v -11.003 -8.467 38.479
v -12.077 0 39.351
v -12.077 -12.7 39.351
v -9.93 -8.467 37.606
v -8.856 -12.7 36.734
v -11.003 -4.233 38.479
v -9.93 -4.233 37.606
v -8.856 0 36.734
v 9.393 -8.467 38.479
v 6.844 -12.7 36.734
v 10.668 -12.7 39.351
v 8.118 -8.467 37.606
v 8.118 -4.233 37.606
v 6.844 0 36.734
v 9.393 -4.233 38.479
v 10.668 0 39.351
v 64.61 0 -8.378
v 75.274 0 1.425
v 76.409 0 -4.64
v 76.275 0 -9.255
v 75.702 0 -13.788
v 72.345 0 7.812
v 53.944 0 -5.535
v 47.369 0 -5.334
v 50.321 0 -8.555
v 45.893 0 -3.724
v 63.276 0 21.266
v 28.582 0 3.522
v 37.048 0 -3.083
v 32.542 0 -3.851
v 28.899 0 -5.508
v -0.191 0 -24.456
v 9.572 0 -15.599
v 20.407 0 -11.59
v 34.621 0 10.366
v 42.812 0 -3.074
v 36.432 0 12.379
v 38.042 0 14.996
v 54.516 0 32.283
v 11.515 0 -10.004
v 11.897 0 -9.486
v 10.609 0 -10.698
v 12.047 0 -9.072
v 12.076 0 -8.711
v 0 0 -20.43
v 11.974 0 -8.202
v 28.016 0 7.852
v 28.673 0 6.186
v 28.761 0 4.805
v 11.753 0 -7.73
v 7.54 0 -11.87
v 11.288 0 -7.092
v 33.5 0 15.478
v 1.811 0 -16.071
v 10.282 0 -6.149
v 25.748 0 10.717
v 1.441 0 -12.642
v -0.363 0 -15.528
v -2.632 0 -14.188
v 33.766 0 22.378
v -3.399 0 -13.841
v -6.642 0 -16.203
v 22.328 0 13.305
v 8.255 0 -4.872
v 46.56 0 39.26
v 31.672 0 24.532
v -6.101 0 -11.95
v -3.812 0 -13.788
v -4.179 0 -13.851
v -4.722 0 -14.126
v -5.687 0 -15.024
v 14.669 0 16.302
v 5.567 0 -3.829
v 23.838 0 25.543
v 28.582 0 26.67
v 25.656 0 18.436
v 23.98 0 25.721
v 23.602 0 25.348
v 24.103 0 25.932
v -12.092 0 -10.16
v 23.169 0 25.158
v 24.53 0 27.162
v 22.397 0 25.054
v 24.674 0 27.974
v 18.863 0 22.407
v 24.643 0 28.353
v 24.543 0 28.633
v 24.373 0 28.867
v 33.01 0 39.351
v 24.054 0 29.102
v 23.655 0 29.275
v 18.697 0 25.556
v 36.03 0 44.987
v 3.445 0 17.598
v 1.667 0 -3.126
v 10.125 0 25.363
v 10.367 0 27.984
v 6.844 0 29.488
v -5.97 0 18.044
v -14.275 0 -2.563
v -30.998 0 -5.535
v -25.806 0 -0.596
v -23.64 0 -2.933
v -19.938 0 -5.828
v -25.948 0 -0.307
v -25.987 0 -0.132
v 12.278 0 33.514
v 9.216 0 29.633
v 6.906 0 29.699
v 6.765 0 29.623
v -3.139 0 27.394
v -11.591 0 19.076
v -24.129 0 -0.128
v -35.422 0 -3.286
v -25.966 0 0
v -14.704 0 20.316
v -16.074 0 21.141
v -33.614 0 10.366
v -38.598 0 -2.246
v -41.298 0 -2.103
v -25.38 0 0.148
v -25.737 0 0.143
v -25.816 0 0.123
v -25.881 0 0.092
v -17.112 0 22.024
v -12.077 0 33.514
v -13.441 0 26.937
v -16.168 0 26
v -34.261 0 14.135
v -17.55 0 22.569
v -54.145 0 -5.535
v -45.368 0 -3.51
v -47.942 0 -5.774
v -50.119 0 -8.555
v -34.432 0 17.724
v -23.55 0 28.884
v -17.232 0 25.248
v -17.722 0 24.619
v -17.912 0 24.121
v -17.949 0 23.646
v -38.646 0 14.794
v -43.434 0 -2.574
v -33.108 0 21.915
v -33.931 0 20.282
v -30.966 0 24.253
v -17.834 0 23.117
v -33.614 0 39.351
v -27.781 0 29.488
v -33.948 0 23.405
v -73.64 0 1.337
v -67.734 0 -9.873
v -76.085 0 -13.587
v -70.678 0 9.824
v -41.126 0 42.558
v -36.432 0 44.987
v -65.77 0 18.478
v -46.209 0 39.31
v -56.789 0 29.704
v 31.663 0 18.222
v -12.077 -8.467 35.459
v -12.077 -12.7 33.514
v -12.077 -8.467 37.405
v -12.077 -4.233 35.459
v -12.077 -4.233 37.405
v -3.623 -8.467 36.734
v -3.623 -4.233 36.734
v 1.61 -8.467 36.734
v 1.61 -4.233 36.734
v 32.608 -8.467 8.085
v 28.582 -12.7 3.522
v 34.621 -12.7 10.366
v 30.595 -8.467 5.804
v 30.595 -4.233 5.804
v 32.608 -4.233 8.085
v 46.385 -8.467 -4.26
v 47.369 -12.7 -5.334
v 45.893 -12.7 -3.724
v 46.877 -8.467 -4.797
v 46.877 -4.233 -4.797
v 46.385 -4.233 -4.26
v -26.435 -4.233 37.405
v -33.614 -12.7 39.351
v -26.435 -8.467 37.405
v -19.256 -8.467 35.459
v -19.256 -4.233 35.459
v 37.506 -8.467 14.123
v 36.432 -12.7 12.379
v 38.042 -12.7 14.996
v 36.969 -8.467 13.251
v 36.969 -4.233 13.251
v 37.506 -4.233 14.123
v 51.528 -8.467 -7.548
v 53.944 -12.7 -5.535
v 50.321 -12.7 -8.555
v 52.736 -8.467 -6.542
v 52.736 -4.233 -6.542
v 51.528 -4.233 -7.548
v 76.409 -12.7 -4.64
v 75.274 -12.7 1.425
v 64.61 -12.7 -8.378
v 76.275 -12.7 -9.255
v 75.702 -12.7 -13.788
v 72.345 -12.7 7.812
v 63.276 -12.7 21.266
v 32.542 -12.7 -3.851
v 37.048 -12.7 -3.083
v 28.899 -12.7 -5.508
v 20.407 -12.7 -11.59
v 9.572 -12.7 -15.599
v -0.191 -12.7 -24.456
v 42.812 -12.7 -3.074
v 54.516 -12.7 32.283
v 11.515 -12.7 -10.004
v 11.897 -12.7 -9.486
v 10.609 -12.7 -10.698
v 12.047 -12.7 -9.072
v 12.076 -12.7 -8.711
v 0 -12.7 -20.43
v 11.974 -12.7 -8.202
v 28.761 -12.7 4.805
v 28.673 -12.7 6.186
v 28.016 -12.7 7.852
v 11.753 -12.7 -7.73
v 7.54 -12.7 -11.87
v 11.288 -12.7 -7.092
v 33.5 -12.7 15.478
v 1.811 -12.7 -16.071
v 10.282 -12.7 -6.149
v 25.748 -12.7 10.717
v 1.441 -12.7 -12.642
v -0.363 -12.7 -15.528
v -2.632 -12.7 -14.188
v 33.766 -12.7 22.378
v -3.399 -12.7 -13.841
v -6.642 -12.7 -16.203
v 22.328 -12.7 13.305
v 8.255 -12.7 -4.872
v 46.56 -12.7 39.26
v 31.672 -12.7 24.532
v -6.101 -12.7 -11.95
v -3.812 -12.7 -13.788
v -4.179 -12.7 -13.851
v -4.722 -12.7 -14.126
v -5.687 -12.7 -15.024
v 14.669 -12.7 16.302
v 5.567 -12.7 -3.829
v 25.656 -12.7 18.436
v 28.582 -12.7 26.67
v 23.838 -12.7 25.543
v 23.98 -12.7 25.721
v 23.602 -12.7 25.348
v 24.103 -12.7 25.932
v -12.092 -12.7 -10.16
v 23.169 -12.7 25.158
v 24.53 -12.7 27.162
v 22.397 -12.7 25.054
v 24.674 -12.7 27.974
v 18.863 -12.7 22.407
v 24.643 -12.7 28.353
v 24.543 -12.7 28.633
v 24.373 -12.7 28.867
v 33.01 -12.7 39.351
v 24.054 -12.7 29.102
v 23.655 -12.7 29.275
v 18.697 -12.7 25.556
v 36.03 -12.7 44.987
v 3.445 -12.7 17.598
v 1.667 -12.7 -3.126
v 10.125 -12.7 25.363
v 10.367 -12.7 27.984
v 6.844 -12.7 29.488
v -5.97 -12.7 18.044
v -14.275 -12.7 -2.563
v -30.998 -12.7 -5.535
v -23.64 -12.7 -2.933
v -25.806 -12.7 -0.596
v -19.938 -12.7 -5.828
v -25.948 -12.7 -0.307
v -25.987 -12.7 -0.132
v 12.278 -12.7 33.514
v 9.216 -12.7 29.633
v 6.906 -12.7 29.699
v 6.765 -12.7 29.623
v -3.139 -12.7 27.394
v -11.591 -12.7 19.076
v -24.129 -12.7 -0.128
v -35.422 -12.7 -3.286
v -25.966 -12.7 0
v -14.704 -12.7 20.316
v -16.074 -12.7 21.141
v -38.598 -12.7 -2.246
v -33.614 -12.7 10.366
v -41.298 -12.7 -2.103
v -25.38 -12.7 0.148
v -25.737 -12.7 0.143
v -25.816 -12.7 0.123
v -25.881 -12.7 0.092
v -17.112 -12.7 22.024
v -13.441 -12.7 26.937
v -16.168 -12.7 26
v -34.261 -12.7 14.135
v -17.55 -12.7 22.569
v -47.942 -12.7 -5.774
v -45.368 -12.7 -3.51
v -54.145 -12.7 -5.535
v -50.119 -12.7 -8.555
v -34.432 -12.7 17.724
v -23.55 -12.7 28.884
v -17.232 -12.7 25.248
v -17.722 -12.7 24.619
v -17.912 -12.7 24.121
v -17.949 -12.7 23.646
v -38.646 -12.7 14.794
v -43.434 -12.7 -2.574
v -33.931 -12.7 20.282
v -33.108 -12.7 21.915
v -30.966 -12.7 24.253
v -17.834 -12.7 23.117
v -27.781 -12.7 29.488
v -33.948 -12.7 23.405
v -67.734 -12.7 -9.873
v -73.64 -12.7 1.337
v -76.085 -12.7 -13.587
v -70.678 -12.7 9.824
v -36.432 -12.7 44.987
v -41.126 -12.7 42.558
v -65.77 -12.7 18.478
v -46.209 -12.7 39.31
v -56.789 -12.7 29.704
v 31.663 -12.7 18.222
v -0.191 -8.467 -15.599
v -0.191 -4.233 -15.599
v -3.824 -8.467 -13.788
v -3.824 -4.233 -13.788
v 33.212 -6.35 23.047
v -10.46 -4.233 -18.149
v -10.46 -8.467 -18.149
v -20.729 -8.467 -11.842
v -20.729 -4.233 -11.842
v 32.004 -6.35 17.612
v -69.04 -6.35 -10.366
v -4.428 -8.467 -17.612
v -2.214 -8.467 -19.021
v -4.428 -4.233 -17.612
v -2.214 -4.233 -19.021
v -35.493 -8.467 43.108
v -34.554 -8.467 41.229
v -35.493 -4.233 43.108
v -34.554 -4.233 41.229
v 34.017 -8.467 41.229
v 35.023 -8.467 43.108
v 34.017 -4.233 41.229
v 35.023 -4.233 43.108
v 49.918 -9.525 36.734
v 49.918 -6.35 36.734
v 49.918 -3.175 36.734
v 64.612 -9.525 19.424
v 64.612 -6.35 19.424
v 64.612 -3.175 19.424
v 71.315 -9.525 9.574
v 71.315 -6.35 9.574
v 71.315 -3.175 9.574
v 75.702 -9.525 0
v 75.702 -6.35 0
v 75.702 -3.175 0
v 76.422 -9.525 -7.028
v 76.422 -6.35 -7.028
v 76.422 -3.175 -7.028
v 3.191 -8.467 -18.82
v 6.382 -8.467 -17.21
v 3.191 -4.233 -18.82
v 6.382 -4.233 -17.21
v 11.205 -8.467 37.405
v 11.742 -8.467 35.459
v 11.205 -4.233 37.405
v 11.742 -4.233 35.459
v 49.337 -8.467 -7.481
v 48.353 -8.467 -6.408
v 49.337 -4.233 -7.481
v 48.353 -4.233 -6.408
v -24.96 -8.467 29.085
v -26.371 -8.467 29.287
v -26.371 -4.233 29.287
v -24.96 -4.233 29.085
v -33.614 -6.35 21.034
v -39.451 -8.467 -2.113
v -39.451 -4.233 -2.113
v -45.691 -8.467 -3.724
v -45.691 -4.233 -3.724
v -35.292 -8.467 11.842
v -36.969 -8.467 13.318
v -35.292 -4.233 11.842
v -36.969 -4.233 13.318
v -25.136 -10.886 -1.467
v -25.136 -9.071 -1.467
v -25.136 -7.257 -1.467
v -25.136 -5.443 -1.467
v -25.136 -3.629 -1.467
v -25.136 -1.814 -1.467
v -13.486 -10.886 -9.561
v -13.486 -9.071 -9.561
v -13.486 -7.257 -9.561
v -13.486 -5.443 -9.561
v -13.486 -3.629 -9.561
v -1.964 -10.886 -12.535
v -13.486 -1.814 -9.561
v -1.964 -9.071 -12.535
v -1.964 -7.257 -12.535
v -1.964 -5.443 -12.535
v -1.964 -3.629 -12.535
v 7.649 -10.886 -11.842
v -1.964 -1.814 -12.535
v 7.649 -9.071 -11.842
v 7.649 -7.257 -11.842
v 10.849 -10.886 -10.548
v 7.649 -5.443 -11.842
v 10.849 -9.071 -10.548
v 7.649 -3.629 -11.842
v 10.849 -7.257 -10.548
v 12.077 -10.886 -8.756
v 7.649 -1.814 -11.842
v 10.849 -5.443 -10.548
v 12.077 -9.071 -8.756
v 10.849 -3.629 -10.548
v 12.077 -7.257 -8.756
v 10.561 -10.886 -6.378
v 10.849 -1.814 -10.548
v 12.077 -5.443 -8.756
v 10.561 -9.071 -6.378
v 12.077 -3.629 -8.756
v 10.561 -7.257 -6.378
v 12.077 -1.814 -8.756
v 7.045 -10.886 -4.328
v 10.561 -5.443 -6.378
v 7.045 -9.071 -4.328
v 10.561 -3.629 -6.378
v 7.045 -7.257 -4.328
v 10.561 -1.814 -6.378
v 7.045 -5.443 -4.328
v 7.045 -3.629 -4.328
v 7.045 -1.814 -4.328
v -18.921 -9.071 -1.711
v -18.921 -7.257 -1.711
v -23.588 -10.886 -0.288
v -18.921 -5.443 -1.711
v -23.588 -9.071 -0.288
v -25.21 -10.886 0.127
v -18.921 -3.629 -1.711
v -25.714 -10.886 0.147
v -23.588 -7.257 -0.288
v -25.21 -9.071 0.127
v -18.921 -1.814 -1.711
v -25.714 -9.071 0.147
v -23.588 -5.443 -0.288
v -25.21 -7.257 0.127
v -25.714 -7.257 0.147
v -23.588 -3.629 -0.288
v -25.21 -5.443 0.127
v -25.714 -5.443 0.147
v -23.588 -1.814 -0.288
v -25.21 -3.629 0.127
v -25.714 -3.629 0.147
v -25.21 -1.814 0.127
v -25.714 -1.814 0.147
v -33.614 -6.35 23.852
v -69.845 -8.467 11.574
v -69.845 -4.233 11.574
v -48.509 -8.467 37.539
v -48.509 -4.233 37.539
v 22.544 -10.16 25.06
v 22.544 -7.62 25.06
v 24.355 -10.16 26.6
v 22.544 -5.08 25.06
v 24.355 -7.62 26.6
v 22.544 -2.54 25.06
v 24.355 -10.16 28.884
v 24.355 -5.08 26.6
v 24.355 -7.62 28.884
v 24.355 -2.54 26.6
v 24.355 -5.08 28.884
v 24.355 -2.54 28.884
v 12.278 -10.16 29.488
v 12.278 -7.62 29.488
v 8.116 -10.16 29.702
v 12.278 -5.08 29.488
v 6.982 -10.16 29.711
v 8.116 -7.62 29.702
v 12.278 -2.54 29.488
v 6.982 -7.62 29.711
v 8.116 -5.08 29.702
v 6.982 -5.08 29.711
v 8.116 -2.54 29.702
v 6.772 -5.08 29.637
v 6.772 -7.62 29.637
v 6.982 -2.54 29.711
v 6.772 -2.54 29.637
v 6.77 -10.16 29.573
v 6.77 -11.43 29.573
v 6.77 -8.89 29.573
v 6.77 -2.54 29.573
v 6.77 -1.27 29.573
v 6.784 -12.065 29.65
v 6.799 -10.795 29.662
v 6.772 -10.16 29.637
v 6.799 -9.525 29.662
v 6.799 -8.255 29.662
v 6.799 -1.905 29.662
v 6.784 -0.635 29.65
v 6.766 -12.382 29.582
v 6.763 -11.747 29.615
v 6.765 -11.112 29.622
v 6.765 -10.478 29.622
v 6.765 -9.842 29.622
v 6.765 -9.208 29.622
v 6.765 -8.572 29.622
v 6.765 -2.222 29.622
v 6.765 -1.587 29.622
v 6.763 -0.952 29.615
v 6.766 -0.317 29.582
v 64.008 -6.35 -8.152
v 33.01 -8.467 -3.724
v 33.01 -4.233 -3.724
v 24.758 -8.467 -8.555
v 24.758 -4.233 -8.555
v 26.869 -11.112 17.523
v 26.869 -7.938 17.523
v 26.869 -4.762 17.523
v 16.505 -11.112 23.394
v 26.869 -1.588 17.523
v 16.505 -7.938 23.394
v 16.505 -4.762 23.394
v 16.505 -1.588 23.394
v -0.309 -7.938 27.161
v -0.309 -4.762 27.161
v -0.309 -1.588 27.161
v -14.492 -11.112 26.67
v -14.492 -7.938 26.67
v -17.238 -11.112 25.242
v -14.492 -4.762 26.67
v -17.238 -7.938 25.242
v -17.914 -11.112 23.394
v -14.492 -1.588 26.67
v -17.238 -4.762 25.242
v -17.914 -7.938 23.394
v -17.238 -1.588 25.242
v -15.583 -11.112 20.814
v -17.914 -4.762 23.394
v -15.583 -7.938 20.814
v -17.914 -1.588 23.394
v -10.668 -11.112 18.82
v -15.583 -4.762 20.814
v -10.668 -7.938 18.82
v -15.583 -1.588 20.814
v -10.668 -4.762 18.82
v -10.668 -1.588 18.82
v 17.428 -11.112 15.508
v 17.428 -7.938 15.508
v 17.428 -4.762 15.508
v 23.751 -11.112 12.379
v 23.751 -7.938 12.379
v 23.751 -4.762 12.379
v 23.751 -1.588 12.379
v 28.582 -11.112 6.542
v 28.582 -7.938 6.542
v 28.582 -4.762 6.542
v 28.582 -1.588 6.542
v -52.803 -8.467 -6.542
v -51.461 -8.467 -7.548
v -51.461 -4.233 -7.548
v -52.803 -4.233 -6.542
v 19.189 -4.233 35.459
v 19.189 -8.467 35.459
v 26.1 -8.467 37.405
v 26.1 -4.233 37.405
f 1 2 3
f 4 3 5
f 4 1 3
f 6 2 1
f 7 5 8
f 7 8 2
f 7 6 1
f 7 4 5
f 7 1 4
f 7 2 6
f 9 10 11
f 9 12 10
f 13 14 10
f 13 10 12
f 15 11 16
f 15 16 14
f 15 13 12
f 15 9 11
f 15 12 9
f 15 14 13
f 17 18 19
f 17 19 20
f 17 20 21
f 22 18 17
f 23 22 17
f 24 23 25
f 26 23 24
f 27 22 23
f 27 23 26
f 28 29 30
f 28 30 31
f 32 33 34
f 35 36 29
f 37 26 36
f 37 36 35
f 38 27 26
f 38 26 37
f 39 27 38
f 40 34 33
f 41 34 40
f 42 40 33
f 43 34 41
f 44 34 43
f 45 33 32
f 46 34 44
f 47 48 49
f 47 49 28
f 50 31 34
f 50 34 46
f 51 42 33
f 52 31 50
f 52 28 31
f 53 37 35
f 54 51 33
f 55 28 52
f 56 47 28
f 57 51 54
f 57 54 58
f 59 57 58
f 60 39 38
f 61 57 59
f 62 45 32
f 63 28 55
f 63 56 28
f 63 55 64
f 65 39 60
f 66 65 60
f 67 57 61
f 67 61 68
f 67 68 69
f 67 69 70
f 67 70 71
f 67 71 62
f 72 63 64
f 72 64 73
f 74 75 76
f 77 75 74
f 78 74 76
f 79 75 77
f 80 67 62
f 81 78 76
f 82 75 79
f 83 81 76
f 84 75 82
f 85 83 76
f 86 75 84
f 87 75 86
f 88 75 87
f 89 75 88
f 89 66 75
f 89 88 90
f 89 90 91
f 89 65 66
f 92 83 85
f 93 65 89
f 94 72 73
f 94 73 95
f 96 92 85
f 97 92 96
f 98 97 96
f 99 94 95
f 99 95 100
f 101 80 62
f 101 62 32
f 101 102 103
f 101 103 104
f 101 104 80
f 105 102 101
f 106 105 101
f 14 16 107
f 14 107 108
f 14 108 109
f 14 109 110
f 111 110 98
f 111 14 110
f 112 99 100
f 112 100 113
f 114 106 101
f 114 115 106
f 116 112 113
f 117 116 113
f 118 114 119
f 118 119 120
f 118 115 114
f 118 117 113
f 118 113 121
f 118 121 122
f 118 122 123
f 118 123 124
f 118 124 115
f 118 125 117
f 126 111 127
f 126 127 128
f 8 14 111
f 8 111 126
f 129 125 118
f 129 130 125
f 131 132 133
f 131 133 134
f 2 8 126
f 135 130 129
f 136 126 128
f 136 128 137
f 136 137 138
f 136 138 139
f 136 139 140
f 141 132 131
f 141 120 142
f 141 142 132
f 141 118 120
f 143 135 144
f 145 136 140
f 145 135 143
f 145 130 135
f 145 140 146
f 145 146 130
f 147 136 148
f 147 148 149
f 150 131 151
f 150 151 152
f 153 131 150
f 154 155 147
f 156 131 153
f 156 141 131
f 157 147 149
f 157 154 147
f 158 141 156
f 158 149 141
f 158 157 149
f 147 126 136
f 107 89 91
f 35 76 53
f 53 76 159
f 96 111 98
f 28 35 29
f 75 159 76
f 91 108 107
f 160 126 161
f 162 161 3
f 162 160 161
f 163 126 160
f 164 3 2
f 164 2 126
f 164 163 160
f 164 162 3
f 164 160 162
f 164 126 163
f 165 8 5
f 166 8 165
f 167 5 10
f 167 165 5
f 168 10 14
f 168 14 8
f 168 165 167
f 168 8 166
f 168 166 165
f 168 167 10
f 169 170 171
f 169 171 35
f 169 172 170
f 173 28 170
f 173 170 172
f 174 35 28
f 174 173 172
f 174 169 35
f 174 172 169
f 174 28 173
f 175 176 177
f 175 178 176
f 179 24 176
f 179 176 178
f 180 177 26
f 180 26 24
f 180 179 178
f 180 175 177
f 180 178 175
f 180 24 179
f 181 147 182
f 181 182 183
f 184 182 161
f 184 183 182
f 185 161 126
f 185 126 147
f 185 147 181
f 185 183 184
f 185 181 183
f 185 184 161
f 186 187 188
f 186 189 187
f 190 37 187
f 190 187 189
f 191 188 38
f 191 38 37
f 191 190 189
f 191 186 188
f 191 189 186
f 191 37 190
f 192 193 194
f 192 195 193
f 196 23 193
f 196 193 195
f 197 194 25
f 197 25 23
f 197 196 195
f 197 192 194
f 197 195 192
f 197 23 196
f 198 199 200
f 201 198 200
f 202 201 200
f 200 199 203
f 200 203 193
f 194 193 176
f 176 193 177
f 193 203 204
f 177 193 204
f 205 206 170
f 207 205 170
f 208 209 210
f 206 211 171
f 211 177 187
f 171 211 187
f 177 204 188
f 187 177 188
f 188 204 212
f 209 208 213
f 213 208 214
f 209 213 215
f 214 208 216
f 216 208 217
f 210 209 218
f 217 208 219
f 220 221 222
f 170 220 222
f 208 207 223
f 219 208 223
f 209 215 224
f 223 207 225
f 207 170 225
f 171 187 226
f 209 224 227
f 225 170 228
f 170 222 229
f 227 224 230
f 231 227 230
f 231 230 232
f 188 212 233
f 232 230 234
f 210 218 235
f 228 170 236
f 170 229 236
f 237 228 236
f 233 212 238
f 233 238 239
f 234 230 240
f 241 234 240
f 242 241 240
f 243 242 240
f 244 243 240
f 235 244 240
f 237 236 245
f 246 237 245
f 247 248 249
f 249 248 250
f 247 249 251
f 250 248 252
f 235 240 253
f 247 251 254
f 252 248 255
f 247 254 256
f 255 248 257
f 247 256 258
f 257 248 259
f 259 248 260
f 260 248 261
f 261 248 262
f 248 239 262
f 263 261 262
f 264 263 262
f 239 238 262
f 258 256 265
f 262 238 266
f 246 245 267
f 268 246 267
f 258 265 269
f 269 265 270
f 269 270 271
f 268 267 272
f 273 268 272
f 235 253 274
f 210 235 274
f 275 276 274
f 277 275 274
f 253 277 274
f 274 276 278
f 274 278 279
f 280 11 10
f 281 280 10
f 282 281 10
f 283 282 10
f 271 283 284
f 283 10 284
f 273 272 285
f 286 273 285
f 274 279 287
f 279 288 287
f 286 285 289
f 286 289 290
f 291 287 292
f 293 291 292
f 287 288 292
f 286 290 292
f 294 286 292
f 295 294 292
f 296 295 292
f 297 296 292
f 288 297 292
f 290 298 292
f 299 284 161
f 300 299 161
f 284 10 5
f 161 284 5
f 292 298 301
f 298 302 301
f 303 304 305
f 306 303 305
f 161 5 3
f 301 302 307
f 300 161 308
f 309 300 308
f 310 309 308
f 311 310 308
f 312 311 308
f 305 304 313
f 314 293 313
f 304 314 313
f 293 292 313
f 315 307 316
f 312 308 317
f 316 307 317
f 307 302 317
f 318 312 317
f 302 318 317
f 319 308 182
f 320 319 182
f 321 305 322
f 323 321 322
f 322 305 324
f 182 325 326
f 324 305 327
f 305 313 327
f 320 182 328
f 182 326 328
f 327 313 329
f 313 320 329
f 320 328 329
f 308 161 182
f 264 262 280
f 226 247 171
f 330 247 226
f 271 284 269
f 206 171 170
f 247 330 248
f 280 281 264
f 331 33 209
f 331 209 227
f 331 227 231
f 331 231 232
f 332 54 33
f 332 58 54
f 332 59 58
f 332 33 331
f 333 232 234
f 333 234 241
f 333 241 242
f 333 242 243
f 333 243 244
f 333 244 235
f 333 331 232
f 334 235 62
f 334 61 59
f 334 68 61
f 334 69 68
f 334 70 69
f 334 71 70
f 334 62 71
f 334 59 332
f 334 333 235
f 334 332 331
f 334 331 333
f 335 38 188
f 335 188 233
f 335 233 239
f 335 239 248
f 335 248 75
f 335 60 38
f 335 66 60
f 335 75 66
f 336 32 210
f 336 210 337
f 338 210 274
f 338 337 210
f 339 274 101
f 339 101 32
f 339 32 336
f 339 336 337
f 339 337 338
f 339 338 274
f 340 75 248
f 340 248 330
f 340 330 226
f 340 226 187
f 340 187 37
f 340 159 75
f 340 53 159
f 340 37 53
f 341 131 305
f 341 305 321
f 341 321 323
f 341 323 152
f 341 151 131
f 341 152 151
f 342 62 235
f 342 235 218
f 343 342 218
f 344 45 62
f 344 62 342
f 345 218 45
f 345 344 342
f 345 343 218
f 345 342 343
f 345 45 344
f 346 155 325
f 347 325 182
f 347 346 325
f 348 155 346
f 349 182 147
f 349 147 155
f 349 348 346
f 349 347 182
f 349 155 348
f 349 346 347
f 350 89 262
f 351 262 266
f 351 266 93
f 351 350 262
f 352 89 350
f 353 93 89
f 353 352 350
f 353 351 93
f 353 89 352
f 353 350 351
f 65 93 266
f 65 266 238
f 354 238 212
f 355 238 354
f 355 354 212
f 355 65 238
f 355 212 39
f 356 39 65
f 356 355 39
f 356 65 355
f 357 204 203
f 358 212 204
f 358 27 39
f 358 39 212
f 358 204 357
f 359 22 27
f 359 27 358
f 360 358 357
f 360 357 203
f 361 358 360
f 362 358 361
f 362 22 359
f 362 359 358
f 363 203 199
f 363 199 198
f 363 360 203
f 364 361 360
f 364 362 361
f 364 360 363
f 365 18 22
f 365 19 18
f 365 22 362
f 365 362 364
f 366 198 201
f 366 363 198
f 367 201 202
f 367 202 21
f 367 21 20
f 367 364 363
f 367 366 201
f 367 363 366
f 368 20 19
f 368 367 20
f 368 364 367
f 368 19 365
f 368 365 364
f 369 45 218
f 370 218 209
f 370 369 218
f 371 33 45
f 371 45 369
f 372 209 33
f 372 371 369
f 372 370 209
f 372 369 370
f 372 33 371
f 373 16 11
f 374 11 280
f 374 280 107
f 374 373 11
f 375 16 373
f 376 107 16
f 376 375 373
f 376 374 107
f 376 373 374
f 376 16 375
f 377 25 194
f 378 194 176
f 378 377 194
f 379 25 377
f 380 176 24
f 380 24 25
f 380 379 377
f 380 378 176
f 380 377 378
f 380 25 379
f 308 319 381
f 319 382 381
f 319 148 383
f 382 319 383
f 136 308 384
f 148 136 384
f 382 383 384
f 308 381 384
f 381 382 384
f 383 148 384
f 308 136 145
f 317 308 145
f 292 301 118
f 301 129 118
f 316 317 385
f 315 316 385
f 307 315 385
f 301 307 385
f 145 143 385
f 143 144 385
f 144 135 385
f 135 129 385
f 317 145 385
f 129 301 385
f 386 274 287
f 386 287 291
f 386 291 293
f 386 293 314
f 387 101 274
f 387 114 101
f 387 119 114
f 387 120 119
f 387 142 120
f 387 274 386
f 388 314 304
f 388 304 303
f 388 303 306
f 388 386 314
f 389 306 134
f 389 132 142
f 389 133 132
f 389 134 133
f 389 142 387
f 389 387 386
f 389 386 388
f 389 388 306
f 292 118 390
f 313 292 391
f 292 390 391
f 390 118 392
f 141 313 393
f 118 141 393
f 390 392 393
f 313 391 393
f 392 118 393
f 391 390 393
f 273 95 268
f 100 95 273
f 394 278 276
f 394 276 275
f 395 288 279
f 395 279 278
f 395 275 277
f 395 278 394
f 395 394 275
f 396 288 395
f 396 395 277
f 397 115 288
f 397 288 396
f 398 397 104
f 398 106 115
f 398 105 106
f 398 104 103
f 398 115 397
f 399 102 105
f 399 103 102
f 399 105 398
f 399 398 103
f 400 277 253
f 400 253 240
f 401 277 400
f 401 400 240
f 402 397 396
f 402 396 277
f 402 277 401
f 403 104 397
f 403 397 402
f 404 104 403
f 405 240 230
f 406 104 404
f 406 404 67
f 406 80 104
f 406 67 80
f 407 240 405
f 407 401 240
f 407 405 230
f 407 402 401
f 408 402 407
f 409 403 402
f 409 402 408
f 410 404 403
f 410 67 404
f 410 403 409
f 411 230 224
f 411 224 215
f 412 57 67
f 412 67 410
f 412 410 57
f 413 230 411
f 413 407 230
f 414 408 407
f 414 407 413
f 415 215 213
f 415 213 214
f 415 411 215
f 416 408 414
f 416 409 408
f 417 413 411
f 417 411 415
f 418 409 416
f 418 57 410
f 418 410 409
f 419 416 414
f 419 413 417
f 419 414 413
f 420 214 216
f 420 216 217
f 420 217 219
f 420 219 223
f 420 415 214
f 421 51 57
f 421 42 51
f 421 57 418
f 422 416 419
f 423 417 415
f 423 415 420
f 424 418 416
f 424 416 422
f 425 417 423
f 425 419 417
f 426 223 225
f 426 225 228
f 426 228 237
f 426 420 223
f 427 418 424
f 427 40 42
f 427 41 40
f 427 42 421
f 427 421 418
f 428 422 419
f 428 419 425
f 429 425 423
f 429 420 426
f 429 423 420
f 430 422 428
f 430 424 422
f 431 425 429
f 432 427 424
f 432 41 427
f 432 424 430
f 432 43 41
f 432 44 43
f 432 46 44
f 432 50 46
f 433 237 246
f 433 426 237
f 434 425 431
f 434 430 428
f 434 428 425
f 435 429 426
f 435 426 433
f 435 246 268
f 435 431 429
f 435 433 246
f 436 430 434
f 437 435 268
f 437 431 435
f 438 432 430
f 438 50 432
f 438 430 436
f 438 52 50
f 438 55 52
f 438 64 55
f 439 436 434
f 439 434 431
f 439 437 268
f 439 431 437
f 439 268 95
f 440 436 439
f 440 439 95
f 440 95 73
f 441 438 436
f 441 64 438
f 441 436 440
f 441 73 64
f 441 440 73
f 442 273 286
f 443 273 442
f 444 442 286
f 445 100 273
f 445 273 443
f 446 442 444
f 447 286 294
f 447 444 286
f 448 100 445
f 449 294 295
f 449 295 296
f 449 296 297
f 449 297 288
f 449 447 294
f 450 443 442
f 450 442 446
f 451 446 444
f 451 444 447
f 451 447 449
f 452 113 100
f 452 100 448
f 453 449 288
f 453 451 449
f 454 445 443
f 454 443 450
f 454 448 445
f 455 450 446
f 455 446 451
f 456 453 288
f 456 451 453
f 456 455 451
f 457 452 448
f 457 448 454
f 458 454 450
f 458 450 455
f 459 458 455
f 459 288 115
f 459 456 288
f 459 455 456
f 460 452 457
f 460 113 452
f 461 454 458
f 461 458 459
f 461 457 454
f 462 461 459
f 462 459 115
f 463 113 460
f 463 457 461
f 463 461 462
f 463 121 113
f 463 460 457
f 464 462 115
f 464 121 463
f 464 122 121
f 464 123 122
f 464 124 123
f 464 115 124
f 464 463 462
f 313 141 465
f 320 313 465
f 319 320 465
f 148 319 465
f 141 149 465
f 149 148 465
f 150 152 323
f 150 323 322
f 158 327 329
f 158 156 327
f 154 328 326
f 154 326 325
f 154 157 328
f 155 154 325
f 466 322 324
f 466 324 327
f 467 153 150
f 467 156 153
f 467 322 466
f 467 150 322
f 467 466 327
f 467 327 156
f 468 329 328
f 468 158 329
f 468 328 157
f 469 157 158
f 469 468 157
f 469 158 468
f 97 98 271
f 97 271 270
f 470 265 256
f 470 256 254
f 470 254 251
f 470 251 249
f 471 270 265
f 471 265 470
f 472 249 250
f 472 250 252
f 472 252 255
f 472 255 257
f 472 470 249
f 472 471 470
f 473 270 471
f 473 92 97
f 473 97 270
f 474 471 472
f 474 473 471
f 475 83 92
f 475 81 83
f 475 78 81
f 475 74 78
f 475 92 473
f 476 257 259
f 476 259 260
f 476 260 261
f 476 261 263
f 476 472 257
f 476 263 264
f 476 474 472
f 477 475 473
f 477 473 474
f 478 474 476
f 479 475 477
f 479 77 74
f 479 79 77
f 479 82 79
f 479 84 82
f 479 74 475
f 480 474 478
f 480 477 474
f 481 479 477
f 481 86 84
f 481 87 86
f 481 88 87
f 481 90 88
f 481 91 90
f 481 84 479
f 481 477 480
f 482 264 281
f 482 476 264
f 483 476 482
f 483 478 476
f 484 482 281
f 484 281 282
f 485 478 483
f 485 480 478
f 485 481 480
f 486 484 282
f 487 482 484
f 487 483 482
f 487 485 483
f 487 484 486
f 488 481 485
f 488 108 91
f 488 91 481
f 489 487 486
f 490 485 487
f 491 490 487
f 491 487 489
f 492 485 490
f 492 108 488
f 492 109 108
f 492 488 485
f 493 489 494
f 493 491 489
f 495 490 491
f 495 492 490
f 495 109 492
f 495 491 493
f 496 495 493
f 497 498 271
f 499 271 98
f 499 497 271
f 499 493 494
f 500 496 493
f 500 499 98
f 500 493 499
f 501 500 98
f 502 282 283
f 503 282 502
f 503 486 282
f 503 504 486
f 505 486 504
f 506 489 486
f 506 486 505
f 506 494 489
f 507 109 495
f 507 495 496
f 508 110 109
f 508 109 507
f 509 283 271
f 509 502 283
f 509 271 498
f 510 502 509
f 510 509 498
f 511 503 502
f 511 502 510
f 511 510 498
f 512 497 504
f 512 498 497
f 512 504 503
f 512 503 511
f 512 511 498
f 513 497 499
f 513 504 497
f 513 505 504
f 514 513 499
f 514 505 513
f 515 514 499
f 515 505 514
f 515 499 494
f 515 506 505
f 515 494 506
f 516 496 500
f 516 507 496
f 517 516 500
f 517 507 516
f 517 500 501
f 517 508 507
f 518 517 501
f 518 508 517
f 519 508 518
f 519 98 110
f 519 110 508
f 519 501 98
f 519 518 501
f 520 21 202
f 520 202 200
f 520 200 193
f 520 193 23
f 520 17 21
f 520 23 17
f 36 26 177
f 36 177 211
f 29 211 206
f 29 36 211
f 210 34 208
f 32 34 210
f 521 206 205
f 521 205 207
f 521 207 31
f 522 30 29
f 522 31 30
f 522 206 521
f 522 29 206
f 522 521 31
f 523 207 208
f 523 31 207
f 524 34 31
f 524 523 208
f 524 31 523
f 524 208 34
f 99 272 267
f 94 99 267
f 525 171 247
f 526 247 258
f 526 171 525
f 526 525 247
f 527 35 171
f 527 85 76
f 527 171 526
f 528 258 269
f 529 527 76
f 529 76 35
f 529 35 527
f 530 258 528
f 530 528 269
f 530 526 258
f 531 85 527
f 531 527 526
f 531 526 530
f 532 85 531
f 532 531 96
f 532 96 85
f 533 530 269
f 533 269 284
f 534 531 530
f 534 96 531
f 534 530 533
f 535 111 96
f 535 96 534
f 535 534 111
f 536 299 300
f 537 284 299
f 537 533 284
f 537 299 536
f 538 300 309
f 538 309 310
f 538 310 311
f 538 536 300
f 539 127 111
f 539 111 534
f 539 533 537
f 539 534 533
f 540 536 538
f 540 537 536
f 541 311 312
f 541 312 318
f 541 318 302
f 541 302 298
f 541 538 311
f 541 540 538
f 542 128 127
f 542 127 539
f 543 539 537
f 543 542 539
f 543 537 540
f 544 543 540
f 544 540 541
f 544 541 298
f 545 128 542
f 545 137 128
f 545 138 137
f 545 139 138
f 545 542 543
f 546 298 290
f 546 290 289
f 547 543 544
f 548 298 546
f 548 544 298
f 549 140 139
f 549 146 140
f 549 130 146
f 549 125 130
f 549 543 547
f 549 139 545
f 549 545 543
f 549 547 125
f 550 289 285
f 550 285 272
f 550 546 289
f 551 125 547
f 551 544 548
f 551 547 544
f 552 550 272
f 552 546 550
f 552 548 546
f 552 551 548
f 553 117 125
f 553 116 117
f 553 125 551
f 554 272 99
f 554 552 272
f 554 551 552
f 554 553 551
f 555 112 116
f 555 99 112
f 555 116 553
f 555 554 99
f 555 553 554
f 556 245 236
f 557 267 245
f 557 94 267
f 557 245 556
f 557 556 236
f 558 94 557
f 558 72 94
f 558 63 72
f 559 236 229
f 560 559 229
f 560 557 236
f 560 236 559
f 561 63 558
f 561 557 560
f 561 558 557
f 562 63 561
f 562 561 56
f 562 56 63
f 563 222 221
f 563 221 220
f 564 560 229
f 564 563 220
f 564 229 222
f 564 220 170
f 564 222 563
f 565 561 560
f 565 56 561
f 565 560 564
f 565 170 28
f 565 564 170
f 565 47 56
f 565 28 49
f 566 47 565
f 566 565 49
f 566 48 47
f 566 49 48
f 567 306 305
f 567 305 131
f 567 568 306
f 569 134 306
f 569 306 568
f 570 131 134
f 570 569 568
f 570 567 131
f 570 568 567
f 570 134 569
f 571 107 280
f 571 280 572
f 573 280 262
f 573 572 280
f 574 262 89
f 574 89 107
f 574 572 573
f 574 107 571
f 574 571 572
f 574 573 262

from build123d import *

# Parameters (mm, degrees)
F1_DEPTH = 12.7


with BuildPart() as f1:
    # F0 (on Front) → F1 (new body)
    with BuildSketch(Plane.XZ):
        with BuildLine():
            add(Edge.make_bspline(
                [(-76.0849788785, -13.5866040364), (-75.1266334343, -5.3273665478), (-73.0771035303, 12.335945069), (-49.6056721398, 38.4653316771), (-40.1545708662, 43.144034753), (-36.4322289824, 44.9867546558)],
                knots=[0, 0, 0, 0, 0.3474100913, 0.7429756935, 1, 1, 1, 1], degree=3))
            add(Edge.make_bspline(
                [(-54.1451312602, -5.5352831259), (-59.5874650975, -7.1701927341), (-68.8575981646, -9.954996106), (-73.9728163094, -12.5252864388), (-76.0849788785, -13.5866040364)],
                knots=[0, 0, 0, 0, 0.5870826015, 1, 1, 1, 1], degree=3))
            add(Edge.make_bspline(
                [(-50.1194708049, -8.5545284674), (-51.4613576233, -7.5481133536), (-52.8032444417, -6.5416982397), (-54.1451312602, -5.5352831259)],
                knots=[0, 0, 0, 0, 5.032075569, 5.032075569, 5.032075569, 5.032075569], degree=3))
            add(Edge.make_bspline(
                [(-30.9975855052, -5.5352831259), (-33.8619504322, -3.9726631978), (-39.1340688079, -1.0965222565), (-46.1454382464, -3.1601805859), (-48.7910919356, -6.7513882983), (-50.1194708049, -8.5545284674)],
                knots=[0, 0, 0, 0, 0.3719873227, 0.6846757481, 1, 1, 1, 1], degree=3))
            add(Edge.make_bspline(
                [(-0.1913821681, -24.4558863342), (-10.4601166138, -18.1490185981), (-20.7288510595, -11.842150862), (-30.9975855052, -5.5352831259)],
                knots=[0, 0, 0, 0, 36.1526124895, 36.1526124895, 36.1526124895, 36.1526124895], degree=3))
            add(Edge.make_bspline(
                [(45.8925291896, -3.7237356883), (43.5563374976, -2.6994919805), (31.467830704, -2.6862082338), (24.8869596515, -9.1908633624), (9.5723523332, -18.5127648741), (-0.1913821681, -24.4558863342)],
                knots=[0.1086851231, 0.1086851231, 0.1086851231, 0.1086851231, 0.372618457, 0.6000167233, 1, 1, 1, 1], degree=3))
            add(Edge.make_bspline(
                [(47.3686046898, -5.333999948), (47.1115771965, -4.7397545063), (46.8545497032, -4.1455090646), (45.8925291896, -3.7237356883)],
                knots=[0, 0, 0, 0, 0.1086851231, 0.1086851231, 0.1086851231, 0.1086851231], degree=3))
            add(Edge.make_bspline(
                [(50.3207556903, -8.5545284674), (49.3367053568, -7.4810189609), (48.3526550233, -6.4075094544), (47.3686046898, -5.333999948)],
                knots=[0, 0, 0, 0, 4.3688670699, 4.3688670699, 4.3688670699, 4.3688670699], degree=3))
            add(Edge.make_bspline(
                [(53.9438463748, -5.5352831259), (52.7361494799, -6.5416982397), (51.5284525851, -7.5481133536), (50.3207556903, -8.5545284674)],
                knots=[0, 0, 0, 0, 4.716209128, 4.716209128, 4.716209128, 4.716209128], degree=3))
            add(Edge.make_bspline(
                [(75.7022145423, -13.7878870592), (71.7646079253, -11.6706982095), (64.3027957037, -7.6585997014), (57.2668946221, -6.2164220331), (53.9438463748, -5.5352831259)],
                knots=[0, 0, 0, 0, 0.5277011133, 1, 1, 1, 1], degree=3))
            add(Edge.make_bspline(
                [(36.0296629369, 44.9867546558), (40.7748212655, 42.7061135319), (51.1454645652, 37.7217244023), (64.5500880531, 19.6880556989), (77.7966344464, 0.8665923491), (76.3419932471, -9.3114094257), (75.7022145423, -13.7878870592)],
                knots=[0, 0, 0, 0, 0.2333183418, 0.5099221418, 0.7844544912, 1, 1, 1, 1], degree=3))
            add(Edge.make_bspline(
                [(33.0104157329, 39.3508300185), (34.0168314675, 41.2294715643), (35.0232472022, 43.1081131101), (36.0296629369, 44.9867546558)],
                knots=[0, 0, 0, 0, 6.3937078598, 6.3937078598, 6.3937078598, 6.3937078598], degree=3))
            add(Edge.make_bspline(
                [(12.2782653198, 33.5136242211), (19.1889821241, 35.4593594869), (26.0996989285, 37.4050947527), (33.0104157329, 39.3508300185)],
                knots=[0, 0, 0, 0, 21.5382225885, 21.5382225885, 21.5382225885, 21.5382225885], degree=3))
            add(Edge.make_bspline(
                [(10.667999275, 39.3508300185), (11.2047546233, 37.4050947527), (11.7415099715, 35.4593594869), (12.2782653198, 33.5136242211)],
                knots=[0, 0, 0, 0, 6.0552397357, 6.0552397357, 6.0552397357, 6.0552397357], degree=3))
            add(Edge.make_bspline(
                [(6.8436227739, 36.7341525853), (8.1184149409, 37.6063783964), (9.393207108, 38.4786042074), (10.667999275, 39.3508300185)],
                knots=[0, 0, 0, 0, 4.633881355, 4.633881355, 4.633881355, 4.633881355], degree=3))
            add(Edge.make_bspline(
                [(-8.8564530015, 36.7341525853), (-3.6230944097, 36.7341525853), (1.6102641821, 36.7341525853), (6.8436227739, 36.7341525853)],
                knots=[0, 0, 0, 0, 15.7000757754, 15.7000757754, 15.7000757754, 15.7000757754], degree=3))
            add(Edge.make_bspline(
                [(-12.0769813657, 39.3508300185), (-11.003471911, 38.4786042074), (-9.9299624562, 37.6063783964), (-8.8564530015, 36.7341525853)],
                knots=[0, 0, 0, 0, 4.1495546429, 4.1495546429, 4.1495546429, 4.1495546429], degree=3))
            add(Edge.make_bspline(
                [(-12.0769813657, 33.5136242211), (-12.0769813657, 35.4593594869), (-12.0769813657, 37.4050947527), (-12.0769813657, 39.3508300185)],
                knots=[0, 0, 0, 0, 5.8372057974, 5.8372057974, 5.8372057974, 5.8372057974], degree=3))
            add(Edge.make_bspline(
                [(-33.6142629385, 39.3508300185), (-26.4351690809, 37.4050947527), (-19.2560752233, 35.4593594869), (-12.0769813657, 33.5136242211)],
                knots=[0, 0, 0, 0, 22.3142884509, 22.3142884509, 22.3142884509, 22.3142884509], degree=3))
            add(Edge.make_bspline(
                [(-36.4322289824, 44.9867546558), (-35.4929069678, 43.1081131101), (-34.5535849531, 41.2294715643), (-33.6142629385, 39.3508300185)],
                knots=[0, 0, 0, 0, 6.3011569686, 6.3011569686, 6.3011569686, 6.3011569686], degree=3))
        make_face()
        with BuildLine():
            add(Edge.make_bspline(
                [(-25.9655099362, 0), (-26.4053859361, -0.9492438834), (-12.8347117123, -13.0033917423), (6.6146725075, -13.252580443), (14.1418353423, -8.9267539058), (6.5770467519, -2.8613569567), (-5.4798314929, -2.9435458935), (-17.5978501683, -2.8913700534), (-25.6668002692, 0.6446096726), (-25.9655099362, 0)],
                knots=[0, 0, 0, 0, 0.1694237236, 0.3664343089, 0.4657084991, 0.5763378141, 0.726556048, 0.8849482489, 1, 1, 1, 1], degree=3))
        make_face(mode=Mode.SUBTRACT)
        with BuildLine():
            add(Edge.make_bspline(
                [(-6.6423397511, -16.203282401), (-4.4282265007, -17.6122635603), (-2.2141132504, -19.0212447196), (0, -20.430225879)],
                knots=[0, 0, 0, 0, 7.8732285967, 7.8732285967, 7.8732285967, 7.8732285967], degree=3))
            add(Edge.make_bspline(
                [(9.5723523332, -15.599434264), (5.9062627188, -16.0825425035), (-0.1237685013, -16.8771651324), (-3.82224687, -12.5788660357), (-5.7164585763, -15.0133290824), (-6.6423397511, -16.203282401)],
                knots=[0, 0, 0, 0, 0.4422120481, 0.7273560487, 1, 1, 1, 1], degree=3))
            add(Edge.make_bspline(
                [(0, -20.430225879), (3.1907841111, -18.8199620073), (6.3815682221, -17.2096981357), (9.5723523332, -15.599434264)],
                knots=[0, 0, 0, 0, 10.7222421544, 10.7222421544, 10.7222421544, 10.7222421544], degree=3))
        make_face(mode=Mode.SUBTRACT)
        with BuildLine():
            add(Edge.make_bspline(
                [(-27.7810885193, 29.4879619032), (-26.3707635673, 29.2866788805), (-24.9604386152, 29.0853958577), (-23.5501136631, 28.8841128349)],
                knots=[0, 0, 0, 0, 4.2738486089, 4.2738486089, 4.2738486089, 4.2738486089], degree=3))
            add(Edge.make_bspline(
                [(-23.5501136631, 28.8841128349), (-27.7810885193, 26.5999283672), (-35.8801380352, 22.2274790534), (-34.3466505961, 14.19997935), (-33.6142629385, 10.3660766035)],
                knots=[0, 0, 0, 0, 0.5224038757, 1, 1, 1, 1], degree=3))
            add(Edge.make_bspline(
                [(-33.6142629385, 10.3660766035), (-35.2916220824, 11.8421517933), (-36.9689812263, 13.3182269831), (-38.6463403702, 14.794302173)],
                knots=[0, 0, 0, 0, 6.7030578822, 6.7030578822, 6.7030578822, 6.7030578822], degree=3))
            add(Edge.make_bspline(
                [(-38.6463403702, 14.794302173), (-37.107008463, 18.0512181699), (-34.2057412112, 24.1897147991), (-29.8335271215, 27.7953681706), (-27.7810885193, 29.4879619032)],
                knots=[0, 0, 0, 0, 0.5305722547, 1, 1, 1, 1], degree=3))
        make_face(mode=Mode.SUBTRACT)
        with BuildLine():
            add(Edge.make_bspline(
                [(28.5821892321, 3.5224528983), (30.5950194597, 5.8036608001), (32.6078496873, 8.0848687018), (34.620679915, 10.3660766035)],
                knots=[0, 0, 0, 0, 9.1268042132, 9.1268042132, 9.1268042132, 9.1268042132], degree=3))
            add(Edge.make_bspline(
                [(34.620679915, 10.3660766035), (29.7427422613, 15.2798370903), (19.0995022745, 26.0012394149), (-13.8669190621, 29.1066006849), (-19.8201411378, 23.0283141679), (-9.783296683, 16.9342926846), (9.4145944389, 18.4802235257), (23.7464212879, 13.7503156822), (29.1806991926, 6.9104832035), (28.7491771328, 4.4677338551), (28.5821892321, 3.5224528983)],
                knots=[0, 0, 0, 0, 0.1670433699, 0.3644742514, 0.4414421431, 0.5449588273, 0.703865198, 0.8412139653, 0.9385539024, 1, 1, 1, 1], degree=3))
        make_face(mode=Mode.SUBTRACT)
        with BuildLine():
            add(Edge.make_bspline(
                [(6.8436227739, 29.4879619032), (7.88056868, 28.606151301), (23.3162050314, 23.423410194), (24.3010540214, 26.4337667412), (25.6266900106, 30.4901189993), (13.1659209359, 28.8836158477), (6.245101303, 29.9969398312), (6.8436227739, 29.4879619032)],
                knots=[0, 0, 0, 0, 0.3130715829, 0.4325993415, 0.549750713, 0.8192962013, 1, 1, 1, 1], degree=3))
        make_face(mode=Mode.SUBTRACT)
        with BuildLine():
            add(Edge.make_bspline(
                [(28.5821892321, 26.6700014472), (29.5561778847, 23.3938715337), (31.349720558, 17.3610714725), (34.8381853239, 13.9414787032), (36.4322289824, 12.3789058998)],
                knots=[0, 0, 0, 0, 0.5430529572, 1, 1, 1, 1], degree=3))
            add(Edge.make_bspline(
                [(38.0424894392, 14.9955851957), (36.527127254, 18.0024512887), (33.8127106111, 23.3885480548), (30.1847767597, 25.6645918718), (28.5821892321, 26.6700014472)],
                knots=[0, 0, 0, 0, 0.5582644025, 1, 1, 1, 1], degree=3))
            add(Edge.make_bspline(
                [(36.4322289824, 12.3789058998), (36.968982468, 13.2511323318), (37.5057359536, 14.1233587638), (38.0424894392, 14.9955851957)],
                knots=[0, 0, 0, 0, 3.0724500446, 3.0724500446, 3.0724500446, 3.0724500446], degree=3))
        make_face(mode=Mode.SUBTRACT)
        with BuildLine():
            add(Edge.make_bspline(
                [(47.3686046898, -5.333999948), (47.1115771965, -4.7397545063), (46.8545497032, -4.1455090646), (45.8925291896, -3.7237356883)],
                knots=[0, 0, 0, 0, 0.1086851231, 0.1086851231, 0.1086851231, 0.1086851231], degree=3))
            add(Edge.make_bspline(
                [(47.3686046898, -5.333999948), (46.8765795231, -4.7972451947), (46.3845543563, -4.2604904415), (45.8925291896, -3.7237356883)],
                knots=[4.3688670699, 4.3688670699, 4.3688670699, 4.3688670699, 6.5533006048, 6.5533006048, 6.5533006048, 6.5533006048], degree=3))
        make_face()
    extrude(amount=F1_DEPTH)


solid = f1.part
